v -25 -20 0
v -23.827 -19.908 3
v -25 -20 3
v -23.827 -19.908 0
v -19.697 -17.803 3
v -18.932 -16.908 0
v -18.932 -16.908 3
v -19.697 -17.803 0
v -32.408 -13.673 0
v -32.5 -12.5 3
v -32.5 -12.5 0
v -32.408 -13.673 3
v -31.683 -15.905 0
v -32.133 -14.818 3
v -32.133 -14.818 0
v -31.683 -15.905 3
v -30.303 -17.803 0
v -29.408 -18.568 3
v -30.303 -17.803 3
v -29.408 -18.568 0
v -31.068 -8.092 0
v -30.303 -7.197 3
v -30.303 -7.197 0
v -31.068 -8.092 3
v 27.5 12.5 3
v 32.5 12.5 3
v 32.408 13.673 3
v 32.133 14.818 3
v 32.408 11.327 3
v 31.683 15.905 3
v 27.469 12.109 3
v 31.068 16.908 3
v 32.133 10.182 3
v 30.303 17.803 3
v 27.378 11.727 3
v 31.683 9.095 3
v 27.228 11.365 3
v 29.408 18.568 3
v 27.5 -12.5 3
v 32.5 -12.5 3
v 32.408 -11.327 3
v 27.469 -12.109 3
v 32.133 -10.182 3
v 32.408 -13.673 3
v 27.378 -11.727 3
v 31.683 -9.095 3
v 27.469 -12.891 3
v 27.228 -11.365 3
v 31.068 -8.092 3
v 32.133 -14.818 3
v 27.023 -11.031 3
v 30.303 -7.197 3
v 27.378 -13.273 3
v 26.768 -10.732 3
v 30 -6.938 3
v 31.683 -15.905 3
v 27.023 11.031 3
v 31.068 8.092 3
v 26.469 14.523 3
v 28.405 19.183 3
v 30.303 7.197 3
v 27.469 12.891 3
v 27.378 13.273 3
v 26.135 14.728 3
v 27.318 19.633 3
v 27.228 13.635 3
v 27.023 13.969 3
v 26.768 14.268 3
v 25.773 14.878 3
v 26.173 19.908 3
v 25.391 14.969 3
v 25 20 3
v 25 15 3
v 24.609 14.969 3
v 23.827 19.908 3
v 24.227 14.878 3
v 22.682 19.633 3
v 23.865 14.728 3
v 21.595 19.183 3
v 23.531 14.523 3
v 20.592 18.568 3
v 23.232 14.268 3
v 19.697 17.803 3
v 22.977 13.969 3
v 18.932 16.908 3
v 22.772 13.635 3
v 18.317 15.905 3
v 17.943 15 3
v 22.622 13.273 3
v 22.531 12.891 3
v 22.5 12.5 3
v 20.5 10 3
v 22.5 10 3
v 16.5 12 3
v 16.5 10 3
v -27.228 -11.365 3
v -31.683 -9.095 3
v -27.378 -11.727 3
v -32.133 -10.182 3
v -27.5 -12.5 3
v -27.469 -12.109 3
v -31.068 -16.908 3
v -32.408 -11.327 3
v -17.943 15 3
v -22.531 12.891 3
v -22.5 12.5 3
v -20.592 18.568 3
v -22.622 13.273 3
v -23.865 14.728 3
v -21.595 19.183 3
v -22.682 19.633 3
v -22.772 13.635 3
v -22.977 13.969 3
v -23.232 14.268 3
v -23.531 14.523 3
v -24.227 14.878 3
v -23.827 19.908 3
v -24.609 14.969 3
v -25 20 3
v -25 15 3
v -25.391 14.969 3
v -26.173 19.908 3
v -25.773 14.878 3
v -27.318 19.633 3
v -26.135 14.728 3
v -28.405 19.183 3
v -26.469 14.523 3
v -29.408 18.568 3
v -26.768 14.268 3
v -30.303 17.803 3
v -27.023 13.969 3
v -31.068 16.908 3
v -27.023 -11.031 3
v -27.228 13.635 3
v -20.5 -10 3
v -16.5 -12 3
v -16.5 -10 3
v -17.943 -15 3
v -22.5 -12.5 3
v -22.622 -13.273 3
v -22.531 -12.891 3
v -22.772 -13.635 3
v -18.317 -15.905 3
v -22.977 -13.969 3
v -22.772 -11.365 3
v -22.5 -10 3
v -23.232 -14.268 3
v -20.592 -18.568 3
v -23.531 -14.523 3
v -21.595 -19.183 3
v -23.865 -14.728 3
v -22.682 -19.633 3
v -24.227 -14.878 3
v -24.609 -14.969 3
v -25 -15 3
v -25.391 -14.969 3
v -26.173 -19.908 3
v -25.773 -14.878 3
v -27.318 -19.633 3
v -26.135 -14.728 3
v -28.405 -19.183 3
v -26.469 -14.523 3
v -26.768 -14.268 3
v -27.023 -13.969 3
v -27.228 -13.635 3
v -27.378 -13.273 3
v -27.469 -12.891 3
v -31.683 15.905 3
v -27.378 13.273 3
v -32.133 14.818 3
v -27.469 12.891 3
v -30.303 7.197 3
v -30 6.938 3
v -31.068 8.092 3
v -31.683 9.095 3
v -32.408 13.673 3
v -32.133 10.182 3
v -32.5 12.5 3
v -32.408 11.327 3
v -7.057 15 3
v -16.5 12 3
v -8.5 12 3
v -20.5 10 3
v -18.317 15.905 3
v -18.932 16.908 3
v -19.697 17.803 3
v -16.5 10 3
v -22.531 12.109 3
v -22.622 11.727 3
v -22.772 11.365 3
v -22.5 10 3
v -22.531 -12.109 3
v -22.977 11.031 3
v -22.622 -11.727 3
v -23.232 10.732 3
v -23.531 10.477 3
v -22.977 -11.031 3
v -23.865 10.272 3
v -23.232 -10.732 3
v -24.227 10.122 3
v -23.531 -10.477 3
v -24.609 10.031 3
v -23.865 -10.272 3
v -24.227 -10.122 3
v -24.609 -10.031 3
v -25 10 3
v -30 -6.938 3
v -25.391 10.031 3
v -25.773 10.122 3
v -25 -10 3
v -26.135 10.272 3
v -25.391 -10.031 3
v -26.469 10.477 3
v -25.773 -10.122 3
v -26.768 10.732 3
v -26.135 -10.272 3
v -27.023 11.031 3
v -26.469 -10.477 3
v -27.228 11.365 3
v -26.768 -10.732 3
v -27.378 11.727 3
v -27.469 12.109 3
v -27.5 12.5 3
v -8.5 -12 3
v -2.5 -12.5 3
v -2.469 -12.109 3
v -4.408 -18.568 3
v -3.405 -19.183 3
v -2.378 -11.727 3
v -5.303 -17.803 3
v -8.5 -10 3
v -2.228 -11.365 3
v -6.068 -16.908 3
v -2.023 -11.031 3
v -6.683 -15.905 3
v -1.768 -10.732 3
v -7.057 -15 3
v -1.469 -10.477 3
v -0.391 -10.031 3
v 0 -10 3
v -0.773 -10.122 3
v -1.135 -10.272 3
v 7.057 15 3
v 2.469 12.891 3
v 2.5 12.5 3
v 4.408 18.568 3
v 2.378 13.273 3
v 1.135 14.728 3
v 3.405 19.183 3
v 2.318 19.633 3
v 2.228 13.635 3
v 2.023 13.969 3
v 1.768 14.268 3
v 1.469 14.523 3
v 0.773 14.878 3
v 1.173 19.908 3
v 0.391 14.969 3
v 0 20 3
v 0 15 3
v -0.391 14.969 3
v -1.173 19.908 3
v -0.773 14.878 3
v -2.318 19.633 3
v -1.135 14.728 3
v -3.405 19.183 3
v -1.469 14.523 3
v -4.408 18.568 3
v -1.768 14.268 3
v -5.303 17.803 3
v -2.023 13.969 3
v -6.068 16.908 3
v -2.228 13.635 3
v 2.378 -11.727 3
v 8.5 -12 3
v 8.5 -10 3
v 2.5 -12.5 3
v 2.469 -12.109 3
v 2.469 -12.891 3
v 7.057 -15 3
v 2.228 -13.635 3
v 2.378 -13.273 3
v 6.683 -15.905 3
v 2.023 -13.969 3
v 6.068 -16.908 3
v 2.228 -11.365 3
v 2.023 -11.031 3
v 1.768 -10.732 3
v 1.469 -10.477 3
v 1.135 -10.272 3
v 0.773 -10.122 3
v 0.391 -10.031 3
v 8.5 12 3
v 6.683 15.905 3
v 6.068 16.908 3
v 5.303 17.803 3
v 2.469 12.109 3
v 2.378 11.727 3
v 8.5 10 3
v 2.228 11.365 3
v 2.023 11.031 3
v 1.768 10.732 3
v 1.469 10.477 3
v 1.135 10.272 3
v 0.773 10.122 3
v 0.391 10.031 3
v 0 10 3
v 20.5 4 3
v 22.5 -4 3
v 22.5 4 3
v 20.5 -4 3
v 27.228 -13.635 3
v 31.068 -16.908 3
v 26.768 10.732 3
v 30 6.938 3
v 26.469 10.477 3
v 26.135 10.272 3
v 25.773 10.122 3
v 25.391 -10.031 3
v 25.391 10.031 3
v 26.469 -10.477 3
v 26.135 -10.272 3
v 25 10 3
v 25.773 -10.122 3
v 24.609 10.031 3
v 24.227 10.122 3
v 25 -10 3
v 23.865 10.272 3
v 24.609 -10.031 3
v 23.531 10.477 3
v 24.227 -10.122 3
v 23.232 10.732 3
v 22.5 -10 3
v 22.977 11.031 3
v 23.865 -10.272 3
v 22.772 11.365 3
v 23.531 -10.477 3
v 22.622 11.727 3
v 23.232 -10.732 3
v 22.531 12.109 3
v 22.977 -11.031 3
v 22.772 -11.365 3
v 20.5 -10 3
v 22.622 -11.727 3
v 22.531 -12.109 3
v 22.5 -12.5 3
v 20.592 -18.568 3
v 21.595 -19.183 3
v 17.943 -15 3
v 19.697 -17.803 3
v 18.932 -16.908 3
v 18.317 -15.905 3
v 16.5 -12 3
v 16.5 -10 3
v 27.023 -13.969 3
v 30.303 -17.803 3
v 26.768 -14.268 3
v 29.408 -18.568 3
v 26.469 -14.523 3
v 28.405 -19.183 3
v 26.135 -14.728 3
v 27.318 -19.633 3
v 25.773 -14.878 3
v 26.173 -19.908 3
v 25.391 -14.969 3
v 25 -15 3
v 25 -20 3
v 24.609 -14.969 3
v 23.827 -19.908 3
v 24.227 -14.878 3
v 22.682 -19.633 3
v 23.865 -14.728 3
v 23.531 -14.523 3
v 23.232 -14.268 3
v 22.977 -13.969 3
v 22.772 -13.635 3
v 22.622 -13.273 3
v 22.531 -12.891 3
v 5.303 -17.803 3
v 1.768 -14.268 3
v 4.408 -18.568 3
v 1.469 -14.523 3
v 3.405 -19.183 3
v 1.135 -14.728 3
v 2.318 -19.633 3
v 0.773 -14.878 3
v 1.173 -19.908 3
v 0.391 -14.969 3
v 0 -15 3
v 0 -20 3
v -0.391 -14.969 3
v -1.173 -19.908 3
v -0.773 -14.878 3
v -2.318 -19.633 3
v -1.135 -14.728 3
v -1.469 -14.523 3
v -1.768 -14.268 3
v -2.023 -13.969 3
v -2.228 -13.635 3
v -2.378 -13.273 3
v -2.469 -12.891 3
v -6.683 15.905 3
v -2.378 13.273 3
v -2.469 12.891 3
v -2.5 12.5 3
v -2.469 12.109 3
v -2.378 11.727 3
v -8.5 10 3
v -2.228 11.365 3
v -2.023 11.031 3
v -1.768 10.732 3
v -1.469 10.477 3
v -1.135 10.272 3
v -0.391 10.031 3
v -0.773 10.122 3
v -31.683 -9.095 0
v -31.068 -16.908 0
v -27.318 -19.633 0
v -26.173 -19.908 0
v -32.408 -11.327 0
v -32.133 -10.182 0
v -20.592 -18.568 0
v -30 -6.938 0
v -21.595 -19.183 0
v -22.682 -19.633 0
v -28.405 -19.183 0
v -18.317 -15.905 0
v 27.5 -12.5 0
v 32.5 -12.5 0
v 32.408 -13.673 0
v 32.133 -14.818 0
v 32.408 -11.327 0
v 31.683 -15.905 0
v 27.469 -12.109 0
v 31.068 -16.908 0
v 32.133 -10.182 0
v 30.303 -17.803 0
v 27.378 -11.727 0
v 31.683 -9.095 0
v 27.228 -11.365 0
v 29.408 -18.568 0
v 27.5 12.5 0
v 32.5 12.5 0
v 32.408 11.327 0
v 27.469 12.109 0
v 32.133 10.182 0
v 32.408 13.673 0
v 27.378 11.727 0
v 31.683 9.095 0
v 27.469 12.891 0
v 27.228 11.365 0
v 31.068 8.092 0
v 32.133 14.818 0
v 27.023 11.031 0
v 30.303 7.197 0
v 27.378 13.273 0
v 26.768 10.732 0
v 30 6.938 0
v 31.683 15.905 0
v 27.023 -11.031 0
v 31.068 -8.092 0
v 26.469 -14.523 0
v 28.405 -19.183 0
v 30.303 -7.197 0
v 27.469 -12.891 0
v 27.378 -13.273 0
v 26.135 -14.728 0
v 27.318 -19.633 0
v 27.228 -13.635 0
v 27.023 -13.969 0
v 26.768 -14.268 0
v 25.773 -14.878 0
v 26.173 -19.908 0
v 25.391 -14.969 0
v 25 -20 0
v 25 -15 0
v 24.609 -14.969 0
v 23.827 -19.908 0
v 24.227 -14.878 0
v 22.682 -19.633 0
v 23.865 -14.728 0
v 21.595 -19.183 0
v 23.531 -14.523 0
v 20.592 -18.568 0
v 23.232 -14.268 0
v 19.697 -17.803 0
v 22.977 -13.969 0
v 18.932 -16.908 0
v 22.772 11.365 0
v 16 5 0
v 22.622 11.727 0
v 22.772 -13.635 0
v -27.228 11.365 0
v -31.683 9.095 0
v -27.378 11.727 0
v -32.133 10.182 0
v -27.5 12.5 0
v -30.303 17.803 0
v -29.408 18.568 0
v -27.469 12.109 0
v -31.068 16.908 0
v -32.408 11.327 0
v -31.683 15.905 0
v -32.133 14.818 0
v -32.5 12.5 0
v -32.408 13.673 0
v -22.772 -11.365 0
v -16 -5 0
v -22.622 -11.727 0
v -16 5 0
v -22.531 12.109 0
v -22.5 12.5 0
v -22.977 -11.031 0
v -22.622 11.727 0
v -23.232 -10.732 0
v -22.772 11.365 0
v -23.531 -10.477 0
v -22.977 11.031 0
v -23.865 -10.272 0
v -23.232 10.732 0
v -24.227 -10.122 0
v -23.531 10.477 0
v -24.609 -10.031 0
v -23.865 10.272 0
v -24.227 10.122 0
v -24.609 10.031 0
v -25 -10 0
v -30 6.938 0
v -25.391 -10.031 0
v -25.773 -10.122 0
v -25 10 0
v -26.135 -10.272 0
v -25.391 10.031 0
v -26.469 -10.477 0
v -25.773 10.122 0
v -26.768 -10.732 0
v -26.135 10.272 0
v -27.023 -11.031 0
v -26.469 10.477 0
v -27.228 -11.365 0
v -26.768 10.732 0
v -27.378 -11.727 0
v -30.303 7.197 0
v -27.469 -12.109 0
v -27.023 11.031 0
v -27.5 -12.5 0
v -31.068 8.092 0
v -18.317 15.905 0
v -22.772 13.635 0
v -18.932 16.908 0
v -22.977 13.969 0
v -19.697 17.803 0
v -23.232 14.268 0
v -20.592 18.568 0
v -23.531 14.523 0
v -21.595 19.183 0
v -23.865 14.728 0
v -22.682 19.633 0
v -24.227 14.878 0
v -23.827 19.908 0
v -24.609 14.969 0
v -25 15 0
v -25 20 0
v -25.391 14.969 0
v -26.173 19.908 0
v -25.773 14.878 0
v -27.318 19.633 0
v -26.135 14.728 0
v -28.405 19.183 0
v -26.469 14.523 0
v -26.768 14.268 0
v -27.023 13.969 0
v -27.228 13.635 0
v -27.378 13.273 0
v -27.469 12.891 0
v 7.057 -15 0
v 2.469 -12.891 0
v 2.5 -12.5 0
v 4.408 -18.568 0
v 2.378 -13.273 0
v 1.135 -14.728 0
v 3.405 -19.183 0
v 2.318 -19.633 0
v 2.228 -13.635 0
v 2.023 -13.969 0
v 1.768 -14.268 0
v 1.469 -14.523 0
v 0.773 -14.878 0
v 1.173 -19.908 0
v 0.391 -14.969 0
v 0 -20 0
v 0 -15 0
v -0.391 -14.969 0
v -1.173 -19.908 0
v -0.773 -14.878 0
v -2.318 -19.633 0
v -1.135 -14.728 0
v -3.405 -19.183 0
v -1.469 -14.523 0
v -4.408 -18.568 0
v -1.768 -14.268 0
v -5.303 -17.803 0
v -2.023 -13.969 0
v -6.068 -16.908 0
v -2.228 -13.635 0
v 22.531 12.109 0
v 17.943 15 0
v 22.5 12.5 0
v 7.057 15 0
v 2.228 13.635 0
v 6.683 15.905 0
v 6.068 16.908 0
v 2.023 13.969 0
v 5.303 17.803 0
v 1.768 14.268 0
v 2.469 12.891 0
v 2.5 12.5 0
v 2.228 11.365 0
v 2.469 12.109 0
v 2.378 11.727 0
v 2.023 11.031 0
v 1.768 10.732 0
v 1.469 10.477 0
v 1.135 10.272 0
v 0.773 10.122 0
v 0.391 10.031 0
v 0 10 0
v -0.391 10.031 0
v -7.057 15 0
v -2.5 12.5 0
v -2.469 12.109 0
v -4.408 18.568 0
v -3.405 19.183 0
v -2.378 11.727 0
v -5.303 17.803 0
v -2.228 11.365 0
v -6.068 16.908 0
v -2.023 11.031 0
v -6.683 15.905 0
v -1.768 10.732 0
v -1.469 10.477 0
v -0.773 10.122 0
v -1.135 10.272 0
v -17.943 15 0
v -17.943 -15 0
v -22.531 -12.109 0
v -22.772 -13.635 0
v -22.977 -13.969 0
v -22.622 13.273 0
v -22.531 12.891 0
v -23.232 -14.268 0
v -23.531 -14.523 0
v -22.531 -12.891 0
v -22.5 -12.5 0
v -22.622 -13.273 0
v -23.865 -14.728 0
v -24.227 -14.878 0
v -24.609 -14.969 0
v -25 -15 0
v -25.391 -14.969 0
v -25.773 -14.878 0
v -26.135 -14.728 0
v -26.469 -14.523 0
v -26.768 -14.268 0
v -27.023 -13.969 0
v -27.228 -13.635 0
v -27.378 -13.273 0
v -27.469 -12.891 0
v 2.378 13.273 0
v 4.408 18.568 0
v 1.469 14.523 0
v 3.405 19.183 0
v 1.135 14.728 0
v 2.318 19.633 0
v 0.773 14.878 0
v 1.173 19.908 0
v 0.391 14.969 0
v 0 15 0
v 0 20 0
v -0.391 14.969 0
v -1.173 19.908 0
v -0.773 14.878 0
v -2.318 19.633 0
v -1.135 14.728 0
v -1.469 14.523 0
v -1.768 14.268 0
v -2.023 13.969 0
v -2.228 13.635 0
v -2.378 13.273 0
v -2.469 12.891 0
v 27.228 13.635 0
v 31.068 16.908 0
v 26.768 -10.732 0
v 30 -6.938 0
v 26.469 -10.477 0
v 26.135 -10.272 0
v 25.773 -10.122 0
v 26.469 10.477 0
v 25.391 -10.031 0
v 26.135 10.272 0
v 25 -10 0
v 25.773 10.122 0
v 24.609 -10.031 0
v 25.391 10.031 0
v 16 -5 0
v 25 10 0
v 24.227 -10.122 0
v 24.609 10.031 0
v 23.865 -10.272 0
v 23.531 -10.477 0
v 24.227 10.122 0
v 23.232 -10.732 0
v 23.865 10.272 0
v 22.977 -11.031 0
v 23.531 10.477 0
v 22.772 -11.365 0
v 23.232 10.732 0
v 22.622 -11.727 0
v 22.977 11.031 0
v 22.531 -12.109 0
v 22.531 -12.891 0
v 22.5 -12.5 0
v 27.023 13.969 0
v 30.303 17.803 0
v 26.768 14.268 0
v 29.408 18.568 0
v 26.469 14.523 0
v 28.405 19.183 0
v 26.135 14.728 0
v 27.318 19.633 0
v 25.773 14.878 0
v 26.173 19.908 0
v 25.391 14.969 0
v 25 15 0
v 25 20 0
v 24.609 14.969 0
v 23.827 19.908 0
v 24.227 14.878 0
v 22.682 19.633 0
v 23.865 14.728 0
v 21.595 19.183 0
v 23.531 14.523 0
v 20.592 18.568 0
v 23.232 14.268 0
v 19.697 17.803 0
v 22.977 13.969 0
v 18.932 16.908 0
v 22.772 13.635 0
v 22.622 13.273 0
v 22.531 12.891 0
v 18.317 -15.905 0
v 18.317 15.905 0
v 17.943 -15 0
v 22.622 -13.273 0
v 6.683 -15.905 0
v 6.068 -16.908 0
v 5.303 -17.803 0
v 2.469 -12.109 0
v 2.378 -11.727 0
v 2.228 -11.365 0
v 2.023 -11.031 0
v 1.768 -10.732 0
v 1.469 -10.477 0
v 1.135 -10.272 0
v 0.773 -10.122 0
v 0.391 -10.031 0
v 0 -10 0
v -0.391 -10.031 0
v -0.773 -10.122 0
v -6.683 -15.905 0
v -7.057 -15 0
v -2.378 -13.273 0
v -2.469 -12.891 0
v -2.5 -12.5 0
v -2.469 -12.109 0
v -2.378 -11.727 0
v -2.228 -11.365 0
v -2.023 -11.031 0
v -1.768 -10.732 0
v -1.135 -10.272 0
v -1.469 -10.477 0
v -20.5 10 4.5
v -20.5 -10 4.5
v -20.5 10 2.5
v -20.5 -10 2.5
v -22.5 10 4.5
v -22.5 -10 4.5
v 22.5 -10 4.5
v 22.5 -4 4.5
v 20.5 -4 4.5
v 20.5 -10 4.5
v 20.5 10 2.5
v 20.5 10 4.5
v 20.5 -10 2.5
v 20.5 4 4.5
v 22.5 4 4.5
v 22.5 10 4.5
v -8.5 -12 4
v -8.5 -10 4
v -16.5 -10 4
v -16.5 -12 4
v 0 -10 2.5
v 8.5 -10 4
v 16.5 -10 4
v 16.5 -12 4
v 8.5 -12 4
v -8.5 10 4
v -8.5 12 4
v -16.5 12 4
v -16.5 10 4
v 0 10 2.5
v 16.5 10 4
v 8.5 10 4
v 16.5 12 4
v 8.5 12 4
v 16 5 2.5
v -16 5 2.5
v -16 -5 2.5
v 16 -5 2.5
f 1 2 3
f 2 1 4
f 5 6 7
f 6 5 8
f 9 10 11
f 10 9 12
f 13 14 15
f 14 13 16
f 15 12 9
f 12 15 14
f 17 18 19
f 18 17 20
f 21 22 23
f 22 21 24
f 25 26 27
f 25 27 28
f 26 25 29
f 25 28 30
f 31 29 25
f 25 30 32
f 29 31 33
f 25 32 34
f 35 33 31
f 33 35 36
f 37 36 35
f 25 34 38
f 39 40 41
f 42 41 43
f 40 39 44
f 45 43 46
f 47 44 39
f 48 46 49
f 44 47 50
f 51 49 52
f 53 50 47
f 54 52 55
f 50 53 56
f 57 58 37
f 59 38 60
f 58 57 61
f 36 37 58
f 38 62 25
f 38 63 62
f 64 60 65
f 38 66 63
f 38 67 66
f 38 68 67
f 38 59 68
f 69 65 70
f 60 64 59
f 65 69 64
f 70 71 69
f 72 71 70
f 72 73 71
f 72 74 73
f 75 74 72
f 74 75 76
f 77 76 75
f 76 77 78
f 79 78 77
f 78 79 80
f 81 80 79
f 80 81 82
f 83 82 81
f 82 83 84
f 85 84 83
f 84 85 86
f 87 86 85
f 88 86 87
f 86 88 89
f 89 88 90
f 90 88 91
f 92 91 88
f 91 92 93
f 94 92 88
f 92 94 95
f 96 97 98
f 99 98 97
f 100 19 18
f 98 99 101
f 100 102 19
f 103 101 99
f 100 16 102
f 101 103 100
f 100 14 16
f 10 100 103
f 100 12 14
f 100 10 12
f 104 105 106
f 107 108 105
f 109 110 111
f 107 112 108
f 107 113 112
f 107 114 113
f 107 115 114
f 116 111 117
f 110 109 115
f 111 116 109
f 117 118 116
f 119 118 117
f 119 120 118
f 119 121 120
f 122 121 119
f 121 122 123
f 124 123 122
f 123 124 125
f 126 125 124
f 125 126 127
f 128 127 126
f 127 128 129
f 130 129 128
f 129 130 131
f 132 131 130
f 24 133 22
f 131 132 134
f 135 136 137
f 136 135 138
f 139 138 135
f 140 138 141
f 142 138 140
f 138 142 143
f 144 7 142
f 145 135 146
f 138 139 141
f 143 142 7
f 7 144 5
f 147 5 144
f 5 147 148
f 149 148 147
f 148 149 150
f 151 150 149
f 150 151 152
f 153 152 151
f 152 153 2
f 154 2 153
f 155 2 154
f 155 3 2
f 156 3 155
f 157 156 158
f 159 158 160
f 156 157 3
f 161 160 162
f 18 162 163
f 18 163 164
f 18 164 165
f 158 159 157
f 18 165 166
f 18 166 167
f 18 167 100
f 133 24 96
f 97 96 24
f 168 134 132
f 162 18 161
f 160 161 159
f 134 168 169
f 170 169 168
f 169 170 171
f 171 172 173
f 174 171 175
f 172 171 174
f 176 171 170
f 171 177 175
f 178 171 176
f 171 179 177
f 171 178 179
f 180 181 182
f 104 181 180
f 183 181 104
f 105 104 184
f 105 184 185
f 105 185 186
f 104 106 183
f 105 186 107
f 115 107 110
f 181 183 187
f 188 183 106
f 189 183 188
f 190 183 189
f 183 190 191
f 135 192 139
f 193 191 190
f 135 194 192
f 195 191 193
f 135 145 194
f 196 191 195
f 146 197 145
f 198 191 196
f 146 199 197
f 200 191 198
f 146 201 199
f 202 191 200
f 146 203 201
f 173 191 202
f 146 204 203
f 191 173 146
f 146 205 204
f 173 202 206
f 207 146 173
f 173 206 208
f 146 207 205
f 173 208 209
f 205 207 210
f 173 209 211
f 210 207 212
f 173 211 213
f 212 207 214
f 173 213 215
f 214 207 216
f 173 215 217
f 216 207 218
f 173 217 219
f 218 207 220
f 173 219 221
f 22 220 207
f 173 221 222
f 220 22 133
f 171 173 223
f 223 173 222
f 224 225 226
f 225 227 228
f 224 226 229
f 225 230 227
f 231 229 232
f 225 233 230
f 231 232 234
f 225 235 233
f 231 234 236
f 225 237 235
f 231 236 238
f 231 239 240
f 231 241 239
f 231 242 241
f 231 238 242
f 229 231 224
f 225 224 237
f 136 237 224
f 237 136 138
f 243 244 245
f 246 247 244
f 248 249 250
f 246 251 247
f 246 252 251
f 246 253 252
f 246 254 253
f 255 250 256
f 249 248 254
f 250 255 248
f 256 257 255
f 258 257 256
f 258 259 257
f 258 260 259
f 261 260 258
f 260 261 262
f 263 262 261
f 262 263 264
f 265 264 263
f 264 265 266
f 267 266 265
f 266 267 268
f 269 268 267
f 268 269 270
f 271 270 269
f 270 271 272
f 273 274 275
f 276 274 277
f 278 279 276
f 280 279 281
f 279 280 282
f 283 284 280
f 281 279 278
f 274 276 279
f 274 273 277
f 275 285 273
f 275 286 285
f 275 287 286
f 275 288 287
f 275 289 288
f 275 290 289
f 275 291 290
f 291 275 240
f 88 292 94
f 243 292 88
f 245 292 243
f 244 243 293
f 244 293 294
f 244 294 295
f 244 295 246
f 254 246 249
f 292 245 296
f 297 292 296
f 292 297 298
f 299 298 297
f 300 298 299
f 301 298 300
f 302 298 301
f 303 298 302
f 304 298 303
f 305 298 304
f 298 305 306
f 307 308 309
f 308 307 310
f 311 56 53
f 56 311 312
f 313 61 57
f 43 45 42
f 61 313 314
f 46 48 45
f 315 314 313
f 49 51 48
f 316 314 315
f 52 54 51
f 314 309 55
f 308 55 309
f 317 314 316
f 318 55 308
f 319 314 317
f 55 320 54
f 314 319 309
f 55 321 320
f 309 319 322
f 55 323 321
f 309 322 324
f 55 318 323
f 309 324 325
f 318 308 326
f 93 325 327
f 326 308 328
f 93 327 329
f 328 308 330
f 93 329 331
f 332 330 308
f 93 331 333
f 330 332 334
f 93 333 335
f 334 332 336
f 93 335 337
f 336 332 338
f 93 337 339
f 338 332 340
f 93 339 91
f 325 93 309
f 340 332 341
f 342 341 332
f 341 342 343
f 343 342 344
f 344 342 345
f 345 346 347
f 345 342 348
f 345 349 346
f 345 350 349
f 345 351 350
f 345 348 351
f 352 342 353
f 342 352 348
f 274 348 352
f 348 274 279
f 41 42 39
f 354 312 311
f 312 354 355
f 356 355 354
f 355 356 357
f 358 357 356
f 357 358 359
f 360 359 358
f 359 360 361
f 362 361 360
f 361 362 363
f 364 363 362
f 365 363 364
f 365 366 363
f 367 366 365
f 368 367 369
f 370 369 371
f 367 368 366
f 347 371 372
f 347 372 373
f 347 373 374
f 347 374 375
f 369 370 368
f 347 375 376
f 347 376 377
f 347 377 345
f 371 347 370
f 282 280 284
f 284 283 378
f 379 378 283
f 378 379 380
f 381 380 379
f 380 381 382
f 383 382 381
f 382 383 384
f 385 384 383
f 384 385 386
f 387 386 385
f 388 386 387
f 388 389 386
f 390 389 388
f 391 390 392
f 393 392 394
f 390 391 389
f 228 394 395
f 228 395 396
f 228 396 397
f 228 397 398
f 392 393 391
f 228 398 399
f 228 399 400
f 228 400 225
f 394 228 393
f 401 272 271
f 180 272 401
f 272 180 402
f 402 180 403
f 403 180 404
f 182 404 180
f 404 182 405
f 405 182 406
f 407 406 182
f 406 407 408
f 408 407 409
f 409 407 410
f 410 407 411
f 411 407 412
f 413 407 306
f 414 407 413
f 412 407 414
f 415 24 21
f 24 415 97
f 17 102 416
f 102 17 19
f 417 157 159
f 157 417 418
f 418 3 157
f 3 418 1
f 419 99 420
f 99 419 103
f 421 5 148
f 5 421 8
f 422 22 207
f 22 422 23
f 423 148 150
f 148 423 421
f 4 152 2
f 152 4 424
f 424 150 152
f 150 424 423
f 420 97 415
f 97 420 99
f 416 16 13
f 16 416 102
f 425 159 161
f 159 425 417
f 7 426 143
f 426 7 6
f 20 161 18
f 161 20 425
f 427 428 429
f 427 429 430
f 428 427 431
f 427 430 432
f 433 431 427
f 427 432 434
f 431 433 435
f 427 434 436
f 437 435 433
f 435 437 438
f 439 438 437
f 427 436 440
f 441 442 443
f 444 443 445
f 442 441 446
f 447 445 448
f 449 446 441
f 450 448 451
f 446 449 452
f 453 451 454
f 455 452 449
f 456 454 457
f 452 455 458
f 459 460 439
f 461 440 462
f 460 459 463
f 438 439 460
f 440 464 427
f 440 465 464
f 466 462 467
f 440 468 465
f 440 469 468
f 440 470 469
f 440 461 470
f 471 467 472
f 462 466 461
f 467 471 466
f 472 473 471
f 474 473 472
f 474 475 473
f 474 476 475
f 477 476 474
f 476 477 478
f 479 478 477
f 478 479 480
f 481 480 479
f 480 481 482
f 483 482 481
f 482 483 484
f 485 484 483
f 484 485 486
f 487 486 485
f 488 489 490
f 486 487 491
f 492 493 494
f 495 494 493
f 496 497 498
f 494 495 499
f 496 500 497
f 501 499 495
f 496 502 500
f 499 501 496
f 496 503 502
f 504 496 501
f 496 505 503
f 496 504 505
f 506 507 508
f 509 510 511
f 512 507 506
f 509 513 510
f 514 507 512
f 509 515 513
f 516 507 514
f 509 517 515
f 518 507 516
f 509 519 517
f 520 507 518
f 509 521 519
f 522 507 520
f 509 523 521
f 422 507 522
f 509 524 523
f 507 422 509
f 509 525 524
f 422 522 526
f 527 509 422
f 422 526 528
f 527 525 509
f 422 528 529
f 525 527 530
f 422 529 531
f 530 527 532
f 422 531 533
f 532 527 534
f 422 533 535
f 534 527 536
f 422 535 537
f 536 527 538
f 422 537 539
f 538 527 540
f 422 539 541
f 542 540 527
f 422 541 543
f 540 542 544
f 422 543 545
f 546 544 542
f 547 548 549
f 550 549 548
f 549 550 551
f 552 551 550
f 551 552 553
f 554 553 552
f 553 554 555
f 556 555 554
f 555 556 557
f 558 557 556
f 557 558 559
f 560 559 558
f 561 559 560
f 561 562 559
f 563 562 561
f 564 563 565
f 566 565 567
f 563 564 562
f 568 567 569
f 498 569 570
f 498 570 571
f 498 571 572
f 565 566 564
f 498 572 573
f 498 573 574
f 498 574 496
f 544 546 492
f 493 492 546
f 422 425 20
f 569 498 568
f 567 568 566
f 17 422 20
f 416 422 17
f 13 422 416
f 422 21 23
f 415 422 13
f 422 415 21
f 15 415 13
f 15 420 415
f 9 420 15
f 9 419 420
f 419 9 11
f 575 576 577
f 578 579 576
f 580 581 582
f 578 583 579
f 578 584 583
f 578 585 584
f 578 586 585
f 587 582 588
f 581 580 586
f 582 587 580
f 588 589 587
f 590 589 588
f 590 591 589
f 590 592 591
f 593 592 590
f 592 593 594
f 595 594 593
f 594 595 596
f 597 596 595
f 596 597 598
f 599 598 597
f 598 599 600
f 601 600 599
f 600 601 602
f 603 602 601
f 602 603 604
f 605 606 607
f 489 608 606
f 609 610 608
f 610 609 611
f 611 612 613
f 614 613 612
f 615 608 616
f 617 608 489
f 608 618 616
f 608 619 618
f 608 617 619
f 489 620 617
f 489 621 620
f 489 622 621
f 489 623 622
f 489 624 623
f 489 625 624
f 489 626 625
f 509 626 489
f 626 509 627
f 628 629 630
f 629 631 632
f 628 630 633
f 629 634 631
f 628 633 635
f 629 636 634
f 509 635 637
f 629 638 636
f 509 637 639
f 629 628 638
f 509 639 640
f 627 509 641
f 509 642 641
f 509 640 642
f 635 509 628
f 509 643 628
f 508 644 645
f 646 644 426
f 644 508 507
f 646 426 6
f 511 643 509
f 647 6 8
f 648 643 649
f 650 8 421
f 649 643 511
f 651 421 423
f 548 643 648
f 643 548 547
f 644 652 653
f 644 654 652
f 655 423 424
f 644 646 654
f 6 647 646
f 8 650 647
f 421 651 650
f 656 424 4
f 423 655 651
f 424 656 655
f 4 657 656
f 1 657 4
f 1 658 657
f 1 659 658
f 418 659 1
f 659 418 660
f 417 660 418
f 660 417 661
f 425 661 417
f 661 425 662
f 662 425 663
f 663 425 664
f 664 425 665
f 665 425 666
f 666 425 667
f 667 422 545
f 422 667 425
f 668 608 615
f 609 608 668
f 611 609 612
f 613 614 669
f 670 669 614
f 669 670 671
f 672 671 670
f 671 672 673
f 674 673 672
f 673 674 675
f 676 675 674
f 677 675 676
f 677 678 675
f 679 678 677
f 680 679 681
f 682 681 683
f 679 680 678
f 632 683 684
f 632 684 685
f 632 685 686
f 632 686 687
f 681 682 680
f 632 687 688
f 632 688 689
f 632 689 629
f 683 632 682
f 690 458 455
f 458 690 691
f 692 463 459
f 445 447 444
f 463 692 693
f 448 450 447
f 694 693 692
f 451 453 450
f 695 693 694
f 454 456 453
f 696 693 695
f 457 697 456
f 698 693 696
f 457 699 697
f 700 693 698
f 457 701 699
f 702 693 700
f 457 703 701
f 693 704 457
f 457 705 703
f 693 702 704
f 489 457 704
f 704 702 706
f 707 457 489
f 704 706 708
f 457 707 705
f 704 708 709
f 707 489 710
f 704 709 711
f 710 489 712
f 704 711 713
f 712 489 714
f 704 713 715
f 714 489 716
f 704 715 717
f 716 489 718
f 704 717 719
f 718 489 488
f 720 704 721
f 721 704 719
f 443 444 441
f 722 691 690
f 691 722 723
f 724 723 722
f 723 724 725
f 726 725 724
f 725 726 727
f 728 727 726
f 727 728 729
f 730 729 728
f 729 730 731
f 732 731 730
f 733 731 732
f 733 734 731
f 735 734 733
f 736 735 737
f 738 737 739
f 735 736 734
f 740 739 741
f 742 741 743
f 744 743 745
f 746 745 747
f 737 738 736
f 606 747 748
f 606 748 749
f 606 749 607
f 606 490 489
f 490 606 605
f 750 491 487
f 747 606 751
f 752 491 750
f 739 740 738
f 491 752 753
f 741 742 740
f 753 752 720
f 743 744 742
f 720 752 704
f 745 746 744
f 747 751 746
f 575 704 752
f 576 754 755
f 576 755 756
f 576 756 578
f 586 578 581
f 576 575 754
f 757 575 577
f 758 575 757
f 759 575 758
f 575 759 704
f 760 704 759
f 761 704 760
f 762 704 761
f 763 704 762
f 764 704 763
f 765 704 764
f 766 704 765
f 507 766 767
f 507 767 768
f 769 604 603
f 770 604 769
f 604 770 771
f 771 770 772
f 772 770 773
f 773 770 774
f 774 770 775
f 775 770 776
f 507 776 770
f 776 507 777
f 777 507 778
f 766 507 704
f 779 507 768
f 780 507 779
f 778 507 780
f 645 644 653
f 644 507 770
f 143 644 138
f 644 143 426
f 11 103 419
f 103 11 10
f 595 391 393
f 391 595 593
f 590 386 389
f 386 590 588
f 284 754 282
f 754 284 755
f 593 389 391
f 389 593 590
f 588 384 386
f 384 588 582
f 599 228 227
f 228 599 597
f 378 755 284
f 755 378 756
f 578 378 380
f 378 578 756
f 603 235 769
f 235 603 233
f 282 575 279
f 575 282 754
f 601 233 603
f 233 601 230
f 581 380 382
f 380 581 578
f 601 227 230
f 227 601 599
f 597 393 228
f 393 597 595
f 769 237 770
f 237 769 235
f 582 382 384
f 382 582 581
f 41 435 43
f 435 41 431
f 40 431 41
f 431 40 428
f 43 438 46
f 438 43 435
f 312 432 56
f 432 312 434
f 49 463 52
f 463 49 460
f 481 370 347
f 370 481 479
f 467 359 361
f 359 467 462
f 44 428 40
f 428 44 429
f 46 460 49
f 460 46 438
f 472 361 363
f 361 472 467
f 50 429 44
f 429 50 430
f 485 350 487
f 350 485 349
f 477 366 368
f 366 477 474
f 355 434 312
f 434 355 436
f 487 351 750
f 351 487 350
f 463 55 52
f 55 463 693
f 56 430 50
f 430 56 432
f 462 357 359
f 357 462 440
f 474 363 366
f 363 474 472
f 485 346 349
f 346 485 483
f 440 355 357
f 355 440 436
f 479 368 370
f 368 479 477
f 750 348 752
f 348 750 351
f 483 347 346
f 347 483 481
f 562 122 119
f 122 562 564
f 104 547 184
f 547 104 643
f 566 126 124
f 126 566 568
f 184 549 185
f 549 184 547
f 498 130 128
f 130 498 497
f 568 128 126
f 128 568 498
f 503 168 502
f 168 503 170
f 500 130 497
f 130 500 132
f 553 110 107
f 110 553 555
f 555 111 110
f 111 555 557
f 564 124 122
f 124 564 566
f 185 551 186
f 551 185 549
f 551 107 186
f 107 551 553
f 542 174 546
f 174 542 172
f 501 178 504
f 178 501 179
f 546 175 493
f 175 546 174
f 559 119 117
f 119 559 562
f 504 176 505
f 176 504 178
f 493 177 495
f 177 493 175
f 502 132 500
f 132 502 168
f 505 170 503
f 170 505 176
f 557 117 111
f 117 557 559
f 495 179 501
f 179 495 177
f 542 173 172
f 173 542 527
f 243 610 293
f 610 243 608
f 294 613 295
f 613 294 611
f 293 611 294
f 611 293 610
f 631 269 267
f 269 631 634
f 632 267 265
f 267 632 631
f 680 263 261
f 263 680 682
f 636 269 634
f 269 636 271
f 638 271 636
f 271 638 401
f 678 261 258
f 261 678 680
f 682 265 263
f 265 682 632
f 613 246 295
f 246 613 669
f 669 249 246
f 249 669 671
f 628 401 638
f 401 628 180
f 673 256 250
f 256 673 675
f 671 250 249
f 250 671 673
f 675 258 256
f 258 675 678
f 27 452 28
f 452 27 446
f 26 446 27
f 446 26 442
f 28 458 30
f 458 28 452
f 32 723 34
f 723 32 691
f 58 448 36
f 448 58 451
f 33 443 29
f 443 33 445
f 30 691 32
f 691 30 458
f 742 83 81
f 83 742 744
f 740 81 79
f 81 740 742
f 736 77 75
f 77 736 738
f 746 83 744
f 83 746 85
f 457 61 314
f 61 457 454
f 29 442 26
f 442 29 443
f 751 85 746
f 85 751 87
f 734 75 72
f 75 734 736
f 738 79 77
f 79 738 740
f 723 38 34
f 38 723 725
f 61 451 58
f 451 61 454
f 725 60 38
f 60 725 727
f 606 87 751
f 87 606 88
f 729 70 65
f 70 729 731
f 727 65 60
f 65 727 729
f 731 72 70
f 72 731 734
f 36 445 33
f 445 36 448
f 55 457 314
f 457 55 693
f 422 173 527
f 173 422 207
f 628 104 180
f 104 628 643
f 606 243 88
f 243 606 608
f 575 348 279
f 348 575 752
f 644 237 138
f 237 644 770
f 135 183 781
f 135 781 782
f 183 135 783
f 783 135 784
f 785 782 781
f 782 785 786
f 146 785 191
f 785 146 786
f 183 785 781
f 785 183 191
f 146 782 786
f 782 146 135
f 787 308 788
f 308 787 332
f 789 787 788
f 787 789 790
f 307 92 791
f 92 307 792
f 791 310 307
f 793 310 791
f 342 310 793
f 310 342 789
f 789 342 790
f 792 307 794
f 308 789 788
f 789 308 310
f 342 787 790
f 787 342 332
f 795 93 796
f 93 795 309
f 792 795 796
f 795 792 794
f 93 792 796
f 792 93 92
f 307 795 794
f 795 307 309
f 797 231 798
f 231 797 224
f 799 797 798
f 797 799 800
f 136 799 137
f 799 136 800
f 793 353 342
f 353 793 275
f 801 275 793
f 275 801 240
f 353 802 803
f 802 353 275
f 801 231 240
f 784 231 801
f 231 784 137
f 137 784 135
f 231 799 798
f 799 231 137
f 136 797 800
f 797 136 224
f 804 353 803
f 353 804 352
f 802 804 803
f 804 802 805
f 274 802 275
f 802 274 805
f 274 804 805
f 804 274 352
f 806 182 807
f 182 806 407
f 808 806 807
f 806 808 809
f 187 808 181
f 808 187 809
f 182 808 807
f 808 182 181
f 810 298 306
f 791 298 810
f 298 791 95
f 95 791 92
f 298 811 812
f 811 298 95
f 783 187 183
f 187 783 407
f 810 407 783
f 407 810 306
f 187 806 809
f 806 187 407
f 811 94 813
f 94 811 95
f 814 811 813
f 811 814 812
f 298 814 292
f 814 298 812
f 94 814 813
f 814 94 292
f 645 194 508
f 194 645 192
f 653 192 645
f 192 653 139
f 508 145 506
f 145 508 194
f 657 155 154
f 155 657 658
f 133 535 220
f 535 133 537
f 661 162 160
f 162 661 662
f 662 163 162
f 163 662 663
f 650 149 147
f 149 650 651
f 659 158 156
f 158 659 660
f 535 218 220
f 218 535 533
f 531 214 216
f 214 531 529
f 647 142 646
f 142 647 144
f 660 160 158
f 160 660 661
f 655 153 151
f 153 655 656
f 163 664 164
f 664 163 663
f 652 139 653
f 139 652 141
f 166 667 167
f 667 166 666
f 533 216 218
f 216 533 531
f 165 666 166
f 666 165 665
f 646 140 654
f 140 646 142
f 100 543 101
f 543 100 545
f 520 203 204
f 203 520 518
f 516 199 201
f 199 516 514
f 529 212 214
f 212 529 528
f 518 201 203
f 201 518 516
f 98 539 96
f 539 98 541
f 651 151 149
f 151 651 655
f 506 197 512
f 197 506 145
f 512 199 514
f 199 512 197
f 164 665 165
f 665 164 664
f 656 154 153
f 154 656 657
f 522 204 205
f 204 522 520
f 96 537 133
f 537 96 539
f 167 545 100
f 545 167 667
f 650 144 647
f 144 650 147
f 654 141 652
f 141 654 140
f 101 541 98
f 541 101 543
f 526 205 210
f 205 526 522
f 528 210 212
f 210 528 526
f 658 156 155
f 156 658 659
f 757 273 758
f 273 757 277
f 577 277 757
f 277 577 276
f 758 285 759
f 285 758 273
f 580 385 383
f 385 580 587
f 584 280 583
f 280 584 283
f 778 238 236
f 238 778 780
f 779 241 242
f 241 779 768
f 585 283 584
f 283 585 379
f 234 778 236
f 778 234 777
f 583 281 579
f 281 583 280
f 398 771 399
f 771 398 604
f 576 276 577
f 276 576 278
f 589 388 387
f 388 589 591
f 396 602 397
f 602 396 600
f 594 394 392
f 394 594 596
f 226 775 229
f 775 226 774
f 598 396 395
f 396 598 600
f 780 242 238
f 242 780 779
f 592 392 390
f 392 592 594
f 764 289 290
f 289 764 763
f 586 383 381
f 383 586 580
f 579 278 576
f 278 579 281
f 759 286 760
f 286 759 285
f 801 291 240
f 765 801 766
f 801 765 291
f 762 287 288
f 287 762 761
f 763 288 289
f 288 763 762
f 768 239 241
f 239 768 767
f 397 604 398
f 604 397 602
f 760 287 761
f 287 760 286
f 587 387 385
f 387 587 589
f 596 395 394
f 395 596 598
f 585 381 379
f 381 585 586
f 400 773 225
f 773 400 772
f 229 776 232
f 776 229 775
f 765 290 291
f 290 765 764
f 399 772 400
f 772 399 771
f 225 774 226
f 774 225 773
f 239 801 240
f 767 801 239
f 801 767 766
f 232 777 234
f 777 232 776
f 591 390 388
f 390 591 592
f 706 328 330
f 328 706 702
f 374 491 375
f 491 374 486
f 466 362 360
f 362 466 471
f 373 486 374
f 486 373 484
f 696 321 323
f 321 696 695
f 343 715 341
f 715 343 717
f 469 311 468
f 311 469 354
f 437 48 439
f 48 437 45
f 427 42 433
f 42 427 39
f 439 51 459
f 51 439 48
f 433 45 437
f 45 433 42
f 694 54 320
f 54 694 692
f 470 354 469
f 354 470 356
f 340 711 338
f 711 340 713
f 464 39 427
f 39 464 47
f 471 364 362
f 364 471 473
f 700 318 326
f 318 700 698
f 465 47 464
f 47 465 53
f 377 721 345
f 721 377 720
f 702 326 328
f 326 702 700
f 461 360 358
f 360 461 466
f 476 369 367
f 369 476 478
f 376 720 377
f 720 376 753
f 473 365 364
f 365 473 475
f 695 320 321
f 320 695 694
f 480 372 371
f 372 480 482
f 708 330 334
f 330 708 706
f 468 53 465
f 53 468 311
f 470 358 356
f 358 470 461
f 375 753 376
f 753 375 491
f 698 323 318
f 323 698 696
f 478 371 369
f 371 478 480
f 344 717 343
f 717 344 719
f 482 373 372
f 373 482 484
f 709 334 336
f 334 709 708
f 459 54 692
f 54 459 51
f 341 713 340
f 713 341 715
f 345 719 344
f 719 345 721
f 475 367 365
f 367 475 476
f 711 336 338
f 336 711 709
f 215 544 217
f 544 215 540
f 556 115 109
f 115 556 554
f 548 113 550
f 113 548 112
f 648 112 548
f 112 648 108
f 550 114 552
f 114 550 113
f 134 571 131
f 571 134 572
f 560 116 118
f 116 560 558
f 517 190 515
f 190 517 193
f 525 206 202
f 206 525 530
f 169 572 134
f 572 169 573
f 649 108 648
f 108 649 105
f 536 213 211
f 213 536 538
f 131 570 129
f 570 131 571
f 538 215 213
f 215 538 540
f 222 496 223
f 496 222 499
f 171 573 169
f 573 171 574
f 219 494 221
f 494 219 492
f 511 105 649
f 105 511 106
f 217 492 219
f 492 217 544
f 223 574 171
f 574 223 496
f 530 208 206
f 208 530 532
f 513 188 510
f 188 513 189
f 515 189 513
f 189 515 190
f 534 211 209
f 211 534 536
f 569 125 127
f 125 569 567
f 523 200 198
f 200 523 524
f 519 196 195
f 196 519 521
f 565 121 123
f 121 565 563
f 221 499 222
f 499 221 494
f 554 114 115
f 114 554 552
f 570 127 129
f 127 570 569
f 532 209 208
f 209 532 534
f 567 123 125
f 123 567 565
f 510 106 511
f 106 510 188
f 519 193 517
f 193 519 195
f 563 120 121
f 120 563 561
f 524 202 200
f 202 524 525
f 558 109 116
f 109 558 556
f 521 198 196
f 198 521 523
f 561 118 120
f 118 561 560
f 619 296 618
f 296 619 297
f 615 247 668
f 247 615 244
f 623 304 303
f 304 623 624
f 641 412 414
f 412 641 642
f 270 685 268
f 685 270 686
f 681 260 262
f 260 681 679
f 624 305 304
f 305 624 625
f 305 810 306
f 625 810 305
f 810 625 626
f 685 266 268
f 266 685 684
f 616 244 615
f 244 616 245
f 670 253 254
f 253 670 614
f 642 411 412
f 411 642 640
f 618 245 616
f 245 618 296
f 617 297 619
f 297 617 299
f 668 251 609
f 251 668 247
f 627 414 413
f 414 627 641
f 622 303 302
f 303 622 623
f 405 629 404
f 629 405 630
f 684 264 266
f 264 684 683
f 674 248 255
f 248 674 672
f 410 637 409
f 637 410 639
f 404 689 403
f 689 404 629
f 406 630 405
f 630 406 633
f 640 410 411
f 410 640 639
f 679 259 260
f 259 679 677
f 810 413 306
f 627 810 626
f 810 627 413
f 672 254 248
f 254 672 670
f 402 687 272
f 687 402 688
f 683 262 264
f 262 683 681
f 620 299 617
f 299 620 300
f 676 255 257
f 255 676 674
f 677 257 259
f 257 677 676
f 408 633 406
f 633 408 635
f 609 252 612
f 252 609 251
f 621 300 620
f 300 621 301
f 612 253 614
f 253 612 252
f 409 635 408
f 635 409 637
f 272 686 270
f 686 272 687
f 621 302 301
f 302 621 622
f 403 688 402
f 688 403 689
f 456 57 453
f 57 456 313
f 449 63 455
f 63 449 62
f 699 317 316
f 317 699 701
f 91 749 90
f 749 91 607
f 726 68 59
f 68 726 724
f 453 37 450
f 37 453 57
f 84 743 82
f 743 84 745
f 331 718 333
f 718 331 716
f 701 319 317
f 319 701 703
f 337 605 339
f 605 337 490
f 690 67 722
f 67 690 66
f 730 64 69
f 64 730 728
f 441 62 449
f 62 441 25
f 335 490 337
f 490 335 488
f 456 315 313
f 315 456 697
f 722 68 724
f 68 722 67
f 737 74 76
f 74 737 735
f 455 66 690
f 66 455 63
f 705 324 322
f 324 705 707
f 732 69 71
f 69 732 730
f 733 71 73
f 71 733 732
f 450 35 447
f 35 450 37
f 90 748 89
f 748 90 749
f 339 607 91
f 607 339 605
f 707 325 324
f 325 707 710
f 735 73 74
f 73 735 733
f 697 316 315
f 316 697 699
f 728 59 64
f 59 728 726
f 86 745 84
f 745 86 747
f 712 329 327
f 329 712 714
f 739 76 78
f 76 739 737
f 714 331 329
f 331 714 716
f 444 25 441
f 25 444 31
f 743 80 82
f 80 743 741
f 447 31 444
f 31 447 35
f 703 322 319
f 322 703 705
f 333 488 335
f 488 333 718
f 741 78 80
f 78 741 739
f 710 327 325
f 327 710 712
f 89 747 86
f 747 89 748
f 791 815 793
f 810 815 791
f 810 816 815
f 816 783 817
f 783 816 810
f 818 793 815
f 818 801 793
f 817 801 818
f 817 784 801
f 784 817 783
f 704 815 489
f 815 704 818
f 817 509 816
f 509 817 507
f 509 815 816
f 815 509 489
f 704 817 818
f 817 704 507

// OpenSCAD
$fn=40;
height = 3;
plate();
//smallplate();
//smallrotor();
//rotor();
module smallrotor(){
difference(){
union(){
    translate([-12.5,0,0])cylinder(d=15,h=height);
    translate([12.5,0,0])cylinder(d=15,h=height);
    translate([-10,-5,0])cube([20,10,height]);
    cylinder(d=8,h=height+3);
}
    translate([-12.5,0,0])cylinder(d=5,h=height);
    translate([12.5,0,0])cylinder(d=5,h=height);

    translate([0,0,height+1])cylinder(d=4.9,h=30);
    cylinder(d=2,h=5);
    translate([0,0,-0.1])cylinder(d=5,h=1.5);
}

}
module plate(){
    difference(){
        union(){
            translate([-25,-12.5,0])cylinder(d=15,h=height);
            translate([0,-12.5,0])cylinder(d=15,h=height);
            translate([25,-12.5,0])cylinder(d=15,h=height);
            translate([-25,12.5,0])cylinder(d=15,h=height);
            translate([0,12.5,0])cylinder(d=15,h=height);
            translate([25,12.5,0])cylinder(d=15,h=height);
            translate([-30,-15,0])cube([60,30,height]);
            translate([-22.5,-10,height])cube([2,20,1.5]);
            translate([20.5,-10,height])cube([2,6,1.5]);
            translate([20.5,4,height])cube([2,6,1.5]);
            translate([-16.5,-12,height])cube([8,2,1]);
            translate([8.5,-12,height])cube([8,2,1]);
            translate([-16.5,10,height])cube([8,2,1]);
            translate([8.5,10,height])cube([8,2,1]);
        }
            translate([-25,-12.5,0])cylinder(d=5,h=height);
            translate([0,-12.5,0])cylinder(d=5,h=height);
            translate([25,-12.5,0])cylinder(d=5,h=height);
            translate([-25,12.5,0])cylinder(d=5,h=height);
            translate([0,12.5,0])cylinder(d=5,h=height);
            translate([25,12.5,0])cylinder(d=5,h=height);
            translate([-20.5,-10,height-0.5])cube([41,20,2]);
            translate([-16,-5,-0.10])cube([32,10,20]);
    }
}

module smallplate(){
    difference(){
        union(){
            translate([-12.5,-12.5,0])cylinder(d=15,h=height);
            translate([12.5,-12.5,0])cylinder(d=15,h=height);
            translate([-12.5,12.5,0])cylinder(d=15,h=height);
            translate([12.5,12.5,0])cylinder(d=15,h=height);
            
            translate([-15,-15,0])cube([30,30,height]);
            
            translate([-13,-6,height])cube([1.5,12,1.5]);
            translate([11.5,-6,height])cube([1.5,4,1.5]);
            translate([11.5,2,height])cube([1.5,4,1.5]);
            
          

        }
            translate([-12.5,-12.5,0])cylinder(d=5,h=height);
            translate([12.5,-12.5,0])cylinder(d=5,h=height);
            translate([-12.5,12.5,0])cylinder(d=5,h=height);
            translate([12.5,12.5,0])cylinder(d=5,h=height);
        
            translate([-11.5,-6,height-0.5])cube([23,12,1]);
            translate([-5,-2,-0.1])cube([10,4,height+1]);
    }
}


module rotor() {difference(){
    union(){
        cylinder(d=50,h=height);
        cylinder(d=10,h=height+4);
        rotate([0,0,0])translate([4,-1,height])rotate([0,11,0])cube([15,2,3]);
        rotate([0,0,90])translate([4,-1,height])rotate([0,11,0])cube([15,2,3]);
        rotate([0,0,180])translate([4,-1,height])rotate([0,11,0])cube([15,2,3]);
        rotate([0,0,270])translate([4,-1,height])rotate([0,11,0])cube([15,2,3]);
    }
    translate([12.5,12.5,-0.1])cylinder(d=5,h=height+1);
    translate([-12.5,12.5,-0.1])cylinder(d=5,h=height+1);
    translate([12.5,-12.5,-0.1])cylinder(d=5,h=height+1);
    translate([-12.5,-12.5,-0.1])cylinder(d=5,h=height+1);
    translate([0,0,height+1])cylinder(d=5.9,h=30);
    cylinder(d=2,h=5);
    translate([0,0,-0.1])cylinder(d=5,h=1.5);
    translate([0,0,-10])cylinder(d=60,h=10);
}

}
